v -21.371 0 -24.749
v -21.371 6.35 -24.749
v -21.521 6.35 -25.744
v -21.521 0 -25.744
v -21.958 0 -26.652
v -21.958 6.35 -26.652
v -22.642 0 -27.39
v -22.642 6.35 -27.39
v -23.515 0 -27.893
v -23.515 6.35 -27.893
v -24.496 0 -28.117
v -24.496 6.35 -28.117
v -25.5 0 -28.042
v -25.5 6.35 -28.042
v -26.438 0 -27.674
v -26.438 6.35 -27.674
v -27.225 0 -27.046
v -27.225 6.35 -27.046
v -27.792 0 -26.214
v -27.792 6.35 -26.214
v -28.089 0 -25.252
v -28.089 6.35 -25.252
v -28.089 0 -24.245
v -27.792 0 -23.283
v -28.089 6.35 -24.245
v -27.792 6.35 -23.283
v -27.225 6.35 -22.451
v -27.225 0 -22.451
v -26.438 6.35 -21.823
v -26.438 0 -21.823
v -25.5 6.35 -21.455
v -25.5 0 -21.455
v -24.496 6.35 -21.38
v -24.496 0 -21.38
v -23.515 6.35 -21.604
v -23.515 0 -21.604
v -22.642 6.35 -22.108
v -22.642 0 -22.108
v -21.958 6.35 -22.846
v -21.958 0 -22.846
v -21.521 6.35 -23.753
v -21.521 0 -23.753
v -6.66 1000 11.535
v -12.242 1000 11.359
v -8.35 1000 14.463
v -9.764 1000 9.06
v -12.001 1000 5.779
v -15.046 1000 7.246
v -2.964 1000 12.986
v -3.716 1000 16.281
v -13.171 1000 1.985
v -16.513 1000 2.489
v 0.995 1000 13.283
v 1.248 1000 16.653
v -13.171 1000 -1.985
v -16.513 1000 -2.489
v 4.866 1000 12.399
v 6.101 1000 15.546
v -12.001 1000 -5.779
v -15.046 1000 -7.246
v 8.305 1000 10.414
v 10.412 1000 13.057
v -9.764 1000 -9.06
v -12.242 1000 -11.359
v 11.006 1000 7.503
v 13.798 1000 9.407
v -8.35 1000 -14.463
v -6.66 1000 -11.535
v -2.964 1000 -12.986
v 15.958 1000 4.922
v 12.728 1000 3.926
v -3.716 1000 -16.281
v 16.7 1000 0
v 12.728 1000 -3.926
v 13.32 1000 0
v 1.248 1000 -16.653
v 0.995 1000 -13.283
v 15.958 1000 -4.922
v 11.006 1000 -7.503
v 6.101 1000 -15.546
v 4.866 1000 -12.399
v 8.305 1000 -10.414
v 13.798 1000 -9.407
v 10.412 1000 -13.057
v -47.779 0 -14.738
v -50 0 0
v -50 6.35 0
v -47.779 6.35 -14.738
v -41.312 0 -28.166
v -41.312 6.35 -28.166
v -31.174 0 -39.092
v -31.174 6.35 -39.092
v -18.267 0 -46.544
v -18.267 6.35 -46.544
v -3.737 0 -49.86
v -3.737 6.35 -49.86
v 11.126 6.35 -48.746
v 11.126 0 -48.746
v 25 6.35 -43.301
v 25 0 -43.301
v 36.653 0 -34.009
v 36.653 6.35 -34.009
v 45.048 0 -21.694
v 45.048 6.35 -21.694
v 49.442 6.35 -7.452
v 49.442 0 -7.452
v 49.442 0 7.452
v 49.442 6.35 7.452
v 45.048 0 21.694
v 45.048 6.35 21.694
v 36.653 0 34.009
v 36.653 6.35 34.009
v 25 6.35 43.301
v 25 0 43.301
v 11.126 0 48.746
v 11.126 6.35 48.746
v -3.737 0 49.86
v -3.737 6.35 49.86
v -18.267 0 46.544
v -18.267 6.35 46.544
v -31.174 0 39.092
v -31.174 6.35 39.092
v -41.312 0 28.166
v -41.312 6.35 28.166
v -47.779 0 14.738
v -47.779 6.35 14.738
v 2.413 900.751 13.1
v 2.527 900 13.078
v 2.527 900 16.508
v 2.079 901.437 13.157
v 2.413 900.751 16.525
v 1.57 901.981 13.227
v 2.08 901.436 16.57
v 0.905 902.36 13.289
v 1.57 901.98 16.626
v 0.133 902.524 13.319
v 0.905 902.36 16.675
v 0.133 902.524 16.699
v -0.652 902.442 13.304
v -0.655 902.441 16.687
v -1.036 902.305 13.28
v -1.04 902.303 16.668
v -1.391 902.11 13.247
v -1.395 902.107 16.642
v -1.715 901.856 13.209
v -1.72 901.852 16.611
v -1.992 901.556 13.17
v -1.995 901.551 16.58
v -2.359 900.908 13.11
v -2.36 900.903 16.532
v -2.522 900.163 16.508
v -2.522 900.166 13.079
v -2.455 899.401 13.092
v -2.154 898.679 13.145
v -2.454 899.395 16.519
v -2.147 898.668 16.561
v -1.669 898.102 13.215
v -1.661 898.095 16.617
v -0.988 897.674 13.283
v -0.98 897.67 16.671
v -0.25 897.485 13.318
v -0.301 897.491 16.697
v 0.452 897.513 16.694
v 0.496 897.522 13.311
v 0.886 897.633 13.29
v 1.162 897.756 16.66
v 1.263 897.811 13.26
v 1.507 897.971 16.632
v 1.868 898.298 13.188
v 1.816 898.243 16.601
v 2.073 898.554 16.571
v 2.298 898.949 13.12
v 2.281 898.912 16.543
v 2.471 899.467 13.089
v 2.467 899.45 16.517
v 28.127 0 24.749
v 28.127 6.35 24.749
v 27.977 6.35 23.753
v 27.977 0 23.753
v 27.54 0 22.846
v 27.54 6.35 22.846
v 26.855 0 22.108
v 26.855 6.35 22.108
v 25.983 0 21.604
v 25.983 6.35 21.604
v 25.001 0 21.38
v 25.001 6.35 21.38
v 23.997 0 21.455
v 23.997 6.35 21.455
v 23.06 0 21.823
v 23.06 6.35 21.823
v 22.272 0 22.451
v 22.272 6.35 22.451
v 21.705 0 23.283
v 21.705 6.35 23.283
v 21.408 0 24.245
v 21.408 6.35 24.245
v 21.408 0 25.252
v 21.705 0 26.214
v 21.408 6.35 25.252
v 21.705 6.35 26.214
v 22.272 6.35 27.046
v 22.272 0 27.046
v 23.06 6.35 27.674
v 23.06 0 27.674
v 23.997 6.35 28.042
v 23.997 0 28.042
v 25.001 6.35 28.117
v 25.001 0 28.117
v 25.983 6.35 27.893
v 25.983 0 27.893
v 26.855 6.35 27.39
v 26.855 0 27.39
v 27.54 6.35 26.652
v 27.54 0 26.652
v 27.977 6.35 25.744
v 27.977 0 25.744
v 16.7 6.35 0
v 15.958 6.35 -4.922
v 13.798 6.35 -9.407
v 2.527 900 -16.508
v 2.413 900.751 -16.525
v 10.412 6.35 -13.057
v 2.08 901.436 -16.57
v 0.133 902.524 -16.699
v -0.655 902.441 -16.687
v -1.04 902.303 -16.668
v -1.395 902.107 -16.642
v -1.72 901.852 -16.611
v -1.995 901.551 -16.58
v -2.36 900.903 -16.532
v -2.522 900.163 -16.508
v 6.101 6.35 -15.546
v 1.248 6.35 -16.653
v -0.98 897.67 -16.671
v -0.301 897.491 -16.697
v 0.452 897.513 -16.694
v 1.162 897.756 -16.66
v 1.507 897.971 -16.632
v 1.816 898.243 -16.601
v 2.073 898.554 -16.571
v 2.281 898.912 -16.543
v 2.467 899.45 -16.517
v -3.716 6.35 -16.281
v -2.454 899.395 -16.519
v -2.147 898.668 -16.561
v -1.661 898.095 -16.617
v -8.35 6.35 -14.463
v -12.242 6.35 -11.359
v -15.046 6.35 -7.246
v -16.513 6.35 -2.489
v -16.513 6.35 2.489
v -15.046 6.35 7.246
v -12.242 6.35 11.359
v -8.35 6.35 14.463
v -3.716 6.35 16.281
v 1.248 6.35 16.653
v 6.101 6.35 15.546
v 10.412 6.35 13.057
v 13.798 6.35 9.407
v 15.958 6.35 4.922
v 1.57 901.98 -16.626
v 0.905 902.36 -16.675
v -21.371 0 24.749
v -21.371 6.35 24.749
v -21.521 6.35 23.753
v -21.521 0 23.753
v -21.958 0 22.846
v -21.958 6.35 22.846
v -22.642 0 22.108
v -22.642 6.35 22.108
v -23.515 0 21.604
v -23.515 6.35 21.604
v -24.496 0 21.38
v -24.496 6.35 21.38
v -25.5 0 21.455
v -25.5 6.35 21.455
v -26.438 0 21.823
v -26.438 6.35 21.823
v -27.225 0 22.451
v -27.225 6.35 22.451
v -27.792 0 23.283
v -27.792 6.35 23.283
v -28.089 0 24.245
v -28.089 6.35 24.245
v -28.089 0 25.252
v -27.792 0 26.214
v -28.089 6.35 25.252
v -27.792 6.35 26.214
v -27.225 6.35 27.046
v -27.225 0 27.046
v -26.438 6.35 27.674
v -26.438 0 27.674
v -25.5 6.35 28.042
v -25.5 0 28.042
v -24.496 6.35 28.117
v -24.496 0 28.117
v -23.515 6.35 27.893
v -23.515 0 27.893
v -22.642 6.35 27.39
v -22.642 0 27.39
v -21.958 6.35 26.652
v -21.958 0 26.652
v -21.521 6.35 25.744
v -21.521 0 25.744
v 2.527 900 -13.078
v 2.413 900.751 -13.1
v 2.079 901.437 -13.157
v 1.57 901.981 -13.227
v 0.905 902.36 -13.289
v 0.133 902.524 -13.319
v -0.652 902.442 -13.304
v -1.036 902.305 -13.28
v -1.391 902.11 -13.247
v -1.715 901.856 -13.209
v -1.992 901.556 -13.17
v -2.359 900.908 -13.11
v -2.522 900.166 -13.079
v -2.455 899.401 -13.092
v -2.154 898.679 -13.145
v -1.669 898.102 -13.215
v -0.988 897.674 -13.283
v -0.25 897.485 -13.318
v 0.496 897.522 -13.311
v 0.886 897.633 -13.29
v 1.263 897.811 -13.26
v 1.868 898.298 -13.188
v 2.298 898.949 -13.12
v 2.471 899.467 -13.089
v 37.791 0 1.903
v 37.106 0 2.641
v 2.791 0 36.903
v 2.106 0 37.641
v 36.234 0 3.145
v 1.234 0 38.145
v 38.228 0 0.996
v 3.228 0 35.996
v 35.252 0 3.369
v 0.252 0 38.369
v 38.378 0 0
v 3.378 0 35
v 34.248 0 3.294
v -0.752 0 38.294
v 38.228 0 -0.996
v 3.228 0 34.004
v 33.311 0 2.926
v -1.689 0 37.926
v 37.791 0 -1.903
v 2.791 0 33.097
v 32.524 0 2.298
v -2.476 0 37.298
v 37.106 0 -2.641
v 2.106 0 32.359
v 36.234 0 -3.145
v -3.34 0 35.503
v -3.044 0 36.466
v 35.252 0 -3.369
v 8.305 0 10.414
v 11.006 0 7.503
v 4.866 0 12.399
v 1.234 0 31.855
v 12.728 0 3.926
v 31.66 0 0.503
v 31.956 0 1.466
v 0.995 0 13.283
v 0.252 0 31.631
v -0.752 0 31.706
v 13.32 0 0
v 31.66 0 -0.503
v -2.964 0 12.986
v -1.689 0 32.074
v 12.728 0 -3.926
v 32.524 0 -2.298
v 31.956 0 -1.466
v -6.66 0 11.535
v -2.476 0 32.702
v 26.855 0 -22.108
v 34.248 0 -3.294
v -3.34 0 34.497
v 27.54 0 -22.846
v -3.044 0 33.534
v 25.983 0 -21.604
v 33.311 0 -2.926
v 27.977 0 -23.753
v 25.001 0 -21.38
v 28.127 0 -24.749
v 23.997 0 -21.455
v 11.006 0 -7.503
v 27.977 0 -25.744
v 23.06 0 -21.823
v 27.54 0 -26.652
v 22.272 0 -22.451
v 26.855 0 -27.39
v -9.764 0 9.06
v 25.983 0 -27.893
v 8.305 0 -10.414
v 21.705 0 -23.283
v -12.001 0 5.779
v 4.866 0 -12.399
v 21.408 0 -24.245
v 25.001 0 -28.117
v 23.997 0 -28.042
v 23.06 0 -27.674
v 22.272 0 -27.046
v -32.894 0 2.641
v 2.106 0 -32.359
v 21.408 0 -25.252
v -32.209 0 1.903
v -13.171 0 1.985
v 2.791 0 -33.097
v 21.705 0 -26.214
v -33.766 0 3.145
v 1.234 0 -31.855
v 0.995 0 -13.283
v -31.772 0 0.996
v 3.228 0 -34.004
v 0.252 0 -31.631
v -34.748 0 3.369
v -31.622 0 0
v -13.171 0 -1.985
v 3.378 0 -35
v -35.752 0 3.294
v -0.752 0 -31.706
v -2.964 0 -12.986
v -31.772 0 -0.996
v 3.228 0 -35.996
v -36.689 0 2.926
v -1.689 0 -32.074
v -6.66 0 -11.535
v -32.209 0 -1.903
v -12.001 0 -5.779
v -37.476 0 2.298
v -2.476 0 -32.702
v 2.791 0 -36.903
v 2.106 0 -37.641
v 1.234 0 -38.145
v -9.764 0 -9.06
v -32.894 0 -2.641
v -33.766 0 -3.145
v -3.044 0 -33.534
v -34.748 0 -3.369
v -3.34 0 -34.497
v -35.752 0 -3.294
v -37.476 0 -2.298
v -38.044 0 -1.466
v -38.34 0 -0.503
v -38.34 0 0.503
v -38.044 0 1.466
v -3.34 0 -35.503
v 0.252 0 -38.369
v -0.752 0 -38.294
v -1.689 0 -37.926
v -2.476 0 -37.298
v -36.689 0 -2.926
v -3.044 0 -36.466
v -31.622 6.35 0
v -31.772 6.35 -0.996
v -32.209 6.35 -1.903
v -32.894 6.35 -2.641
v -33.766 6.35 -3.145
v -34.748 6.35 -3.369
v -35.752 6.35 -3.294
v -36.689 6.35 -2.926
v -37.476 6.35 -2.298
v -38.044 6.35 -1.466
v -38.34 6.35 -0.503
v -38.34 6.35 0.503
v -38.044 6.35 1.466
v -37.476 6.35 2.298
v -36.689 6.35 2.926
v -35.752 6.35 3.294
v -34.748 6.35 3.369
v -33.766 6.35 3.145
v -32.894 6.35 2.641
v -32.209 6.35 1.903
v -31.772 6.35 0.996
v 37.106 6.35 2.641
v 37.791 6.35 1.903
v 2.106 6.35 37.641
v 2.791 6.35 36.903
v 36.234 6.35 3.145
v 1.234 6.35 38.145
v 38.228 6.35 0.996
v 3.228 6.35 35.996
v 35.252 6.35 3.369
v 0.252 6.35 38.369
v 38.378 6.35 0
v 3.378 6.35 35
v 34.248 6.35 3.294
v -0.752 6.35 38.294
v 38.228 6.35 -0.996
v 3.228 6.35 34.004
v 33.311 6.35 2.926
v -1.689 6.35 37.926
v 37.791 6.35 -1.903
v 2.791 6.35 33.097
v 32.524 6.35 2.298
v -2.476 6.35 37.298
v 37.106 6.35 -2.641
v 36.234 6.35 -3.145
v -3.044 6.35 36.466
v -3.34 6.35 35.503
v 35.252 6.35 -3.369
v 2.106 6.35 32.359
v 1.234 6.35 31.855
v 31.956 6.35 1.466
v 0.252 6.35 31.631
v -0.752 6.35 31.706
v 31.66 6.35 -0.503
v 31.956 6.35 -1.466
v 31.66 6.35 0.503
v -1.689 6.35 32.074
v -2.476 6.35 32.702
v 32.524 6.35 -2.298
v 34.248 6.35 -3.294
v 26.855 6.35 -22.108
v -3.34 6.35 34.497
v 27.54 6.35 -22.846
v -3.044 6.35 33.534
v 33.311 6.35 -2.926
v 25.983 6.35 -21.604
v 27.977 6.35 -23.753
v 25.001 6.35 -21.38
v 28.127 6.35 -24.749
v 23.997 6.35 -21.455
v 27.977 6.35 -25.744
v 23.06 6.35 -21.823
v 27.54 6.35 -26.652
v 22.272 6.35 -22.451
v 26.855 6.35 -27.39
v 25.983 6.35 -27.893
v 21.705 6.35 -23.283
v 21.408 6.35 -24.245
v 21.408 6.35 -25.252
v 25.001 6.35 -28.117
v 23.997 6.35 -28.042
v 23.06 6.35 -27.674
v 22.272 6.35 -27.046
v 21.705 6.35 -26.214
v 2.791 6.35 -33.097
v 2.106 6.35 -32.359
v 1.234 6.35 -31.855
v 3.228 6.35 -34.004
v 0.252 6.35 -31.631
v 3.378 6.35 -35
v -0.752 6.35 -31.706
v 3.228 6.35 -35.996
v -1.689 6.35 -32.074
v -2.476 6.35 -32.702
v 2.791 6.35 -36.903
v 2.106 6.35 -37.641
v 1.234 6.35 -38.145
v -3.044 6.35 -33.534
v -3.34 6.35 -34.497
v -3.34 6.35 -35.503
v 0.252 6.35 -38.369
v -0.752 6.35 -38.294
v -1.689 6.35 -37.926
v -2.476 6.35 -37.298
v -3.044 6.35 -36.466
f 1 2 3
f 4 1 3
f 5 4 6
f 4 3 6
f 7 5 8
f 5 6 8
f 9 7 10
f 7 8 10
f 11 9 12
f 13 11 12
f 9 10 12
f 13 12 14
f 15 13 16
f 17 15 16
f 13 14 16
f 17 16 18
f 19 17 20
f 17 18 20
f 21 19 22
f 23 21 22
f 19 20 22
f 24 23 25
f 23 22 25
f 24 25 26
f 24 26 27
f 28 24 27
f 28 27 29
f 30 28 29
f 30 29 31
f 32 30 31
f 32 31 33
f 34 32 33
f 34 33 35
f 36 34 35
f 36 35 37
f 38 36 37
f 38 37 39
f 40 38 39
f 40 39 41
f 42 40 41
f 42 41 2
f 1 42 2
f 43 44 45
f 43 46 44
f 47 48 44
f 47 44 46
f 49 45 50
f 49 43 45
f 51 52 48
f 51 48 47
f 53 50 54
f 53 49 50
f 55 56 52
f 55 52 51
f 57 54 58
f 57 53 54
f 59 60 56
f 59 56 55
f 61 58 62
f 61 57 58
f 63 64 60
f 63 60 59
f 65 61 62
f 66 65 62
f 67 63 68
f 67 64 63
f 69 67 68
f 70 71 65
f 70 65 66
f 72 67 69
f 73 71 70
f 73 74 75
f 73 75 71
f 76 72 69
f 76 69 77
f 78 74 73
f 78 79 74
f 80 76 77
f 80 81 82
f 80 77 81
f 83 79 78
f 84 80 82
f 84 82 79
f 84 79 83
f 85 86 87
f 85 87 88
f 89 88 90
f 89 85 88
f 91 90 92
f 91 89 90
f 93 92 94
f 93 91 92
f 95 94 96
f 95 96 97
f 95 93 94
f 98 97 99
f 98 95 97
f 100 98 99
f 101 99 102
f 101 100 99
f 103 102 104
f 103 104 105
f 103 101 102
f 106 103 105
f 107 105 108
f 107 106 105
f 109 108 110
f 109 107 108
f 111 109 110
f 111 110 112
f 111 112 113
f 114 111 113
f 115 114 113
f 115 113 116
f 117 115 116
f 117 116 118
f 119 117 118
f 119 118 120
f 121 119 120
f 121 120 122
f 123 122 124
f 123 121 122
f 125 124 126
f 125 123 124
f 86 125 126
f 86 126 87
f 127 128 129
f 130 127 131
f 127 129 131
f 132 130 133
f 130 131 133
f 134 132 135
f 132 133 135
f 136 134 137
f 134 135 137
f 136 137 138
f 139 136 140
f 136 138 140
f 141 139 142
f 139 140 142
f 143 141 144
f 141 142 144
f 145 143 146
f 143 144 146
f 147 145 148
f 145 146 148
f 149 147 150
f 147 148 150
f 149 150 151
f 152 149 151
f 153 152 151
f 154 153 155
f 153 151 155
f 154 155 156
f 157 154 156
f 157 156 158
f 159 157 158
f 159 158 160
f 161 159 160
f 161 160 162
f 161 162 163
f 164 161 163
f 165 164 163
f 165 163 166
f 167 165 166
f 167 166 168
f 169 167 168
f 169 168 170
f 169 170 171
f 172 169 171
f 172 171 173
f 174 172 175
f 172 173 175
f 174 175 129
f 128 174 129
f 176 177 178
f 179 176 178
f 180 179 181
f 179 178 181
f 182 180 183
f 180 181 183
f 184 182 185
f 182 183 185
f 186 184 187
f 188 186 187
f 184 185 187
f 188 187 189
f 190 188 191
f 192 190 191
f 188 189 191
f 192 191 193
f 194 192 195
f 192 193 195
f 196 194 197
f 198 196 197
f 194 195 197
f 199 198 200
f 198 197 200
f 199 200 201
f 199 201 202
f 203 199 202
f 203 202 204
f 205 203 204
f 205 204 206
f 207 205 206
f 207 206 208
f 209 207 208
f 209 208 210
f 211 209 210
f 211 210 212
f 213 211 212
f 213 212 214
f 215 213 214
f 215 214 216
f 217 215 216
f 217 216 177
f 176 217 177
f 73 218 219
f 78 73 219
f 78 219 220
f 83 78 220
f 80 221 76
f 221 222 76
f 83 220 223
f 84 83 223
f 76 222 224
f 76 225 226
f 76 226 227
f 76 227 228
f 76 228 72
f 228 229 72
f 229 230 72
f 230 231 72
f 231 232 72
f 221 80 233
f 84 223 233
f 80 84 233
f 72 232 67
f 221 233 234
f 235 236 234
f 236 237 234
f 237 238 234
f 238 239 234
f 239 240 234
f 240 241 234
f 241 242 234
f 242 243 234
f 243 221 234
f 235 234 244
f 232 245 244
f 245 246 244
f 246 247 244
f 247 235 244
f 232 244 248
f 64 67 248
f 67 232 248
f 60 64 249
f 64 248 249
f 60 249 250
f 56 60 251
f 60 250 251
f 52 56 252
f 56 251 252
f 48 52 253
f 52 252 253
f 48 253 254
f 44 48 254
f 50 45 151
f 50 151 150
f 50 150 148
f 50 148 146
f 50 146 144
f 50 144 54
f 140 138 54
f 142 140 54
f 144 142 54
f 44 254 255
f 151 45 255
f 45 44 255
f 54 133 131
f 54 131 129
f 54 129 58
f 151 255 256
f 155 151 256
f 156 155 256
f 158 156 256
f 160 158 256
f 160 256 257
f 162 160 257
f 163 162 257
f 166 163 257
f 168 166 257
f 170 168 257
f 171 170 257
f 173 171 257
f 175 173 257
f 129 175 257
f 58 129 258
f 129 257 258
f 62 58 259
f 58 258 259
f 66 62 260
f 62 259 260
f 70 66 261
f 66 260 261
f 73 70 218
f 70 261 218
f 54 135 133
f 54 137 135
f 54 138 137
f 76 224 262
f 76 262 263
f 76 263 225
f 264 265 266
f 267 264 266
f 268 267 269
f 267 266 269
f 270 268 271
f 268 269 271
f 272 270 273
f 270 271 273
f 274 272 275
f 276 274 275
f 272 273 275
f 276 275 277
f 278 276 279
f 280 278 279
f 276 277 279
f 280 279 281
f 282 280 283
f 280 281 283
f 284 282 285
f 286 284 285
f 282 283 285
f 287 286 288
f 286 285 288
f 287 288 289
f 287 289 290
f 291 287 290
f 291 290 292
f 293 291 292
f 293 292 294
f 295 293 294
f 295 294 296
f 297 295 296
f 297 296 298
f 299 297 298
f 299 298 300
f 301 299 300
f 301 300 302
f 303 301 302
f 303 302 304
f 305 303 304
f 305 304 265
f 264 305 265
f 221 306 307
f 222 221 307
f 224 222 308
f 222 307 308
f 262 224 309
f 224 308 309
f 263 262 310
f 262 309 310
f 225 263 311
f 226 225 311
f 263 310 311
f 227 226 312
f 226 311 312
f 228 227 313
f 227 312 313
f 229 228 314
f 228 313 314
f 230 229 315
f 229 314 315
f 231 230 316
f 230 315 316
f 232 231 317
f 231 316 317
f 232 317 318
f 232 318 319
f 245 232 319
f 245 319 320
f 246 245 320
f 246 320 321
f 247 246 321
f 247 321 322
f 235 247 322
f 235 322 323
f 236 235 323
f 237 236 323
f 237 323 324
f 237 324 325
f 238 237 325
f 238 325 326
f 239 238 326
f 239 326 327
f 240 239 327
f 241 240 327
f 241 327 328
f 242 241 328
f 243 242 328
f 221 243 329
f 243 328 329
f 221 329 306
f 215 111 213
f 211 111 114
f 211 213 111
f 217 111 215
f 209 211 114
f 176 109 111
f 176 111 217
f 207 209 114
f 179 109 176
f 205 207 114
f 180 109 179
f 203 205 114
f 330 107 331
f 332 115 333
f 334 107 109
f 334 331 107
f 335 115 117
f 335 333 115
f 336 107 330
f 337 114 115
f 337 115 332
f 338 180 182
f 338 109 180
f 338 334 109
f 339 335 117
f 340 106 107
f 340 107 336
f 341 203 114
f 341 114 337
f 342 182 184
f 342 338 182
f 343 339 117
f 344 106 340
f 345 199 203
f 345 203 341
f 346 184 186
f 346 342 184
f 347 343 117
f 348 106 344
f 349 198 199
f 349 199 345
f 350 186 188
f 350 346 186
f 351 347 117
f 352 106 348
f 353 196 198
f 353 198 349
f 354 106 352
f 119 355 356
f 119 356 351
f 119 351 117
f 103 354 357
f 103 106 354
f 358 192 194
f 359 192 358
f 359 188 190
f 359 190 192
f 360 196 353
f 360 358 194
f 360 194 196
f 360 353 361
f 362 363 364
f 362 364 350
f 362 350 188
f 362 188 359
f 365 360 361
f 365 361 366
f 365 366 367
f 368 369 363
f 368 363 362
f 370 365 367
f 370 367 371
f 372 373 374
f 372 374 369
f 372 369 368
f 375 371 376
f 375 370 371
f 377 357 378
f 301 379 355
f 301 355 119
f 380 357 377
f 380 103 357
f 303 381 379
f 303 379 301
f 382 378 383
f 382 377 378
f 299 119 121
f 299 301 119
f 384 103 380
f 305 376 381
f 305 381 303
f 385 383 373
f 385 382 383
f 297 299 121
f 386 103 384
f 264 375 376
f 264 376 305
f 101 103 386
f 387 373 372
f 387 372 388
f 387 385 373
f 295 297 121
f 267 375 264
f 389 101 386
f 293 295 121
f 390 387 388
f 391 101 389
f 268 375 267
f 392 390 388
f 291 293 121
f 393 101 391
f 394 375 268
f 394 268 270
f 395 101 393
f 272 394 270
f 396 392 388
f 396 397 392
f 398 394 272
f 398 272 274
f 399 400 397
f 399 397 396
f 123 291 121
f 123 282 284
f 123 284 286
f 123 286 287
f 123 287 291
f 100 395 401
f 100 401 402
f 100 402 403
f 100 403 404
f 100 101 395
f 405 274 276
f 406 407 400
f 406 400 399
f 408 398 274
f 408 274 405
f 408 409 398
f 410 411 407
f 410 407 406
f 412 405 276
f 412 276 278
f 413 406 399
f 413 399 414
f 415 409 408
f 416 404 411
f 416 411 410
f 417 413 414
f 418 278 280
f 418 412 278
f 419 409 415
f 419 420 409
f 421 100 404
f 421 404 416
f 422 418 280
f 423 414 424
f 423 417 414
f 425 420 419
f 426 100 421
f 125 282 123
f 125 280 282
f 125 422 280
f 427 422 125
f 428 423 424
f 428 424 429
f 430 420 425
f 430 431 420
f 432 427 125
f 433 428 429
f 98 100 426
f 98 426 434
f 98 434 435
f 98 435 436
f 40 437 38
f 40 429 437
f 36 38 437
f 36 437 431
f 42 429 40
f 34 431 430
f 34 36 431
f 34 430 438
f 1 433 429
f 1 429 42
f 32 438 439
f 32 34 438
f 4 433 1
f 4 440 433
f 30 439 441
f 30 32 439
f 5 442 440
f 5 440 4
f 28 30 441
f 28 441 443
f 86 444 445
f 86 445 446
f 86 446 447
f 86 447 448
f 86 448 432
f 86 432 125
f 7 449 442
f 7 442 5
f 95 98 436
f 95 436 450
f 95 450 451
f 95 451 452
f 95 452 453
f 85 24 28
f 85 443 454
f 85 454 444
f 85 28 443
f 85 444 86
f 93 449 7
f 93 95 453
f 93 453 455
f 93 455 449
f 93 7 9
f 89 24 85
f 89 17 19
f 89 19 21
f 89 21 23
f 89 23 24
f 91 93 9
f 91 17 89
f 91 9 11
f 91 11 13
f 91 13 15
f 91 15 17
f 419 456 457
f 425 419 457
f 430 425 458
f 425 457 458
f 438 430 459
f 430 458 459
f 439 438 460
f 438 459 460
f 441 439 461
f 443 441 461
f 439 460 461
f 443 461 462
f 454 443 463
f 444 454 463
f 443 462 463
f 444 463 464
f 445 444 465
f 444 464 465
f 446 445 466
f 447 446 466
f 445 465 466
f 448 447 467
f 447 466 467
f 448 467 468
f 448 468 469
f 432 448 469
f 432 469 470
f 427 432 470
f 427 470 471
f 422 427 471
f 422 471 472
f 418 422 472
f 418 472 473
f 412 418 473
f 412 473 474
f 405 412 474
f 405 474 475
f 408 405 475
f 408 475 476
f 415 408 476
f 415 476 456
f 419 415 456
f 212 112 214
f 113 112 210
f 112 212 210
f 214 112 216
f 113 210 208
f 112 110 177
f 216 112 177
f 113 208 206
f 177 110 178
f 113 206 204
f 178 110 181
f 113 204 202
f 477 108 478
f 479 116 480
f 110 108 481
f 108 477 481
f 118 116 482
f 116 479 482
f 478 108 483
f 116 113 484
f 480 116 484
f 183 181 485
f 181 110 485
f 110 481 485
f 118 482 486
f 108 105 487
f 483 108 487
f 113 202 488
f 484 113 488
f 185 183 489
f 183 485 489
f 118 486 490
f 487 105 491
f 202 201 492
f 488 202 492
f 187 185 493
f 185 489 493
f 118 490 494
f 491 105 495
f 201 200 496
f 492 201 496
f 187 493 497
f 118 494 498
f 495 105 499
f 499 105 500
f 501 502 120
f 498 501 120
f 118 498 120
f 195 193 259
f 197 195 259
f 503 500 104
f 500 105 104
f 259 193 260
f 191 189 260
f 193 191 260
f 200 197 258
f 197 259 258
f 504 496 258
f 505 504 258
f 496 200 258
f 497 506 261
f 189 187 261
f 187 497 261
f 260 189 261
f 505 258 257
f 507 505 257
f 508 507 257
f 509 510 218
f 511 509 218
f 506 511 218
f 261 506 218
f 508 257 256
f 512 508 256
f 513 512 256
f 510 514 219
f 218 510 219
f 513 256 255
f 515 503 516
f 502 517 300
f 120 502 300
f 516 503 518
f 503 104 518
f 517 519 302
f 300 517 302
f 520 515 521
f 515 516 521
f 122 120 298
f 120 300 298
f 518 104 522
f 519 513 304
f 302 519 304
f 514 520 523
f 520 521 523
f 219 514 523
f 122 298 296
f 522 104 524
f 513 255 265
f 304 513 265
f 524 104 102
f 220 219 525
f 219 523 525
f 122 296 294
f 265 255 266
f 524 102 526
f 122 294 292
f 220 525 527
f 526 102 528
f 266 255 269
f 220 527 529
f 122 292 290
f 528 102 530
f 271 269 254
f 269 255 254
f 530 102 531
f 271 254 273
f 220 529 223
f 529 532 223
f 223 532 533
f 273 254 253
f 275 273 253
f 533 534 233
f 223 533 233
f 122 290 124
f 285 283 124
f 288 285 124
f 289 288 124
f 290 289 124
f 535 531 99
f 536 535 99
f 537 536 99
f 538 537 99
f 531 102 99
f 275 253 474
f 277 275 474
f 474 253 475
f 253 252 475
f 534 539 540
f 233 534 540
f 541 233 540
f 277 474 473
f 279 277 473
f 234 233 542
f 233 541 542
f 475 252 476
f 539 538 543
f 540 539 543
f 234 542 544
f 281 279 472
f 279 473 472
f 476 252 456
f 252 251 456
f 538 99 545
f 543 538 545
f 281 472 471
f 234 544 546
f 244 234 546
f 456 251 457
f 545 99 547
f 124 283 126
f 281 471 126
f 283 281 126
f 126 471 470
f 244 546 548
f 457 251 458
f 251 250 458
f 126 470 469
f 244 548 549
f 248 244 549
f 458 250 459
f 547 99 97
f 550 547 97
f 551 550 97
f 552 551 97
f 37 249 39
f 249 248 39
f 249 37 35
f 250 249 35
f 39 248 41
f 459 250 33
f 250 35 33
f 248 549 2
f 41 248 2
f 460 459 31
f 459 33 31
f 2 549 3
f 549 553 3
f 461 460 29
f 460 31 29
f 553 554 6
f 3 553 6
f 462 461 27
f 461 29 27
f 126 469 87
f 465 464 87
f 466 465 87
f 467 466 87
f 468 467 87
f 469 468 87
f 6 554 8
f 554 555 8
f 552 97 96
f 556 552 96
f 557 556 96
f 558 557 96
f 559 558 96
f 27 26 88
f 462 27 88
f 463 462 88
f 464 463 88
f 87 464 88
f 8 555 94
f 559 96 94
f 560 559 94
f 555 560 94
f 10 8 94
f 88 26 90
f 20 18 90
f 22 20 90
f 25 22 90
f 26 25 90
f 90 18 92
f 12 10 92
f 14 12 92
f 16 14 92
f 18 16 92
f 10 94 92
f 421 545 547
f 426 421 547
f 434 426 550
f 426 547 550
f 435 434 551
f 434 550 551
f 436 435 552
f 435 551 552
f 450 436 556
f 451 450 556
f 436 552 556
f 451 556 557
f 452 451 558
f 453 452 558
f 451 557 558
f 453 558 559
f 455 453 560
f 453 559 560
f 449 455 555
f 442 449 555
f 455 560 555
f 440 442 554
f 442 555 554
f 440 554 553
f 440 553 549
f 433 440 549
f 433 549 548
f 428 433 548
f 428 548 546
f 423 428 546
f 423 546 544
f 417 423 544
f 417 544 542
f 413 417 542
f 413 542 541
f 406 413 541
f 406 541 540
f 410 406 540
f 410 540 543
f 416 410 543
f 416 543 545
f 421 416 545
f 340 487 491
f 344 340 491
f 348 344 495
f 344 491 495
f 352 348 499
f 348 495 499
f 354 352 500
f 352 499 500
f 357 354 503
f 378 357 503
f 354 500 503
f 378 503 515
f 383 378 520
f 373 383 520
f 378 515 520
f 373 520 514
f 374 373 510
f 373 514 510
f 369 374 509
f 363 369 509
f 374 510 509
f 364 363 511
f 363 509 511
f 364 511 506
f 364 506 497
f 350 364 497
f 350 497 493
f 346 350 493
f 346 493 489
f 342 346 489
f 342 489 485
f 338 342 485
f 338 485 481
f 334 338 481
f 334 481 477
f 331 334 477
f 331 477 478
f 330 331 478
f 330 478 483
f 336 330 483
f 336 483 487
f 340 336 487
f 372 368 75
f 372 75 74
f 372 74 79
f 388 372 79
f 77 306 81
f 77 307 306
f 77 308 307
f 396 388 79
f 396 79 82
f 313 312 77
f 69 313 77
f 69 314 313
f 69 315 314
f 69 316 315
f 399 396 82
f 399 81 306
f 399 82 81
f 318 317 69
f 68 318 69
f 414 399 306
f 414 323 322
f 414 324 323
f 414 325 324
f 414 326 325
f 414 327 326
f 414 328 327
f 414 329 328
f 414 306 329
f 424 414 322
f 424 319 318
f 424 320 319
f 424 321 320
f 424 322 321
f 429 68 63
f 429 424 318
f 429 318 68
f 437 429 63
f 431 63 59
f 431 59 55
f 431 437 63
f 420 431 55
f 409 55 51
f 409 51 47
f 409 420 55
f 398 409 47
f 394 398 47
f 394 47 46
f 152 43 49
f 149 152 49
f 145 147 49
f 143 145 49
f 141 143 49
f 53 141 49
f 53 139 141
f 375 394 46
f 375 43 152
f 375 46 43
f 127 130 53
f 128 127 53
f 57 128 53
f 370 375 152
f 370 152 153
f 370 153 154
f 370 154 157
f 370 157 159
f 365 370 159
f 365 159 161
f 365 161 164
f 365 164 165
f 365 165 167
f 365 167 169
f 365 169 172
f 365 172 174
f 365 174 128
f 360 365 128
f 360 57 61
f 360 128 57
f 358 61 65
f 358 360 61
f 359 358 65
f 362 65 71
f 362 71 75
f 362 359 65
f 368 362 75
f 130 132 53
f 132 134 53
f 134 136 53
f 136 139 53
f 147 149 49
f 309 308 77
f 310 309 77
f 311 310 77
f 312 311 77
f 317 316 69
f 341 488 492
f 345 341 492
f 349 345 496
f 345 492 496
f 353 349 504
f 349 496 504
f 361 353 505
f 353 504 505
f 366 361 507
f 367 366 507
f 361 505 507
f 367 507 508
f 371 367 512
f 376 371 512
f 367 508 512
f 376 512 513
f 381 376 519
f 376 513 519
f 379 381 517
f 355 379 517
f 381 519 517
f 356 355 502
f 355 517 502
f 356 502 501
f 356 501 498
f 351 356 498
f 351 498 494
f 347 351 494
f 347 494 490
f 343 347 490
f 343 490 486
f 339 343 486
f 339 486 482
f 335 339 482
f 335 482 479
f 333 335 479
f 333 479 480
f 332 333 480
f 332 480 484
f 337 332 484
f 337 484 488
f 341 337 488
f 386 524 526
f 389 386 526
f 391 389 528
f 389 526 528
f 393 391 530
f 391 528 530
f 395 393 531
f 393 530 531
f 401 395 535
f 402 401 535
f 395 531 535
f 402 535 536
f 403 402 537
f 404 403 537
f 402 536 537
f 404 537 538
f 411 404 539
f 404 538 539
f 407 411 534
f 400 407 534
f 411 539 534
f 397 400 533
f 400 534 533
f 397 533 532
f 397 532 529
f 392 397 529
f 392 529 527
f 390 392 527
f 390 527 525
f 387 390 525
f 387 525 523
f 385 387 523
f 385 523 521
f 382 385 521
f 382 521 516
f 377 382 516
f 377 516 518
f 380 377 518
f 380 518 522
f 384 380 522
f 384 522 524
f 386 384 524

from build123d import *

# Parameters (mm, degrees)
SKETCH1_R                      = 16.7
SKETCH1_R_2                    = 13.32
BOSS_EXTRUDE1_DEPTH            = 1000
SKETCH13_R                     = 50
SKETCH13_R_2                   = 16.7
BOSS_EXTRUDE2_DEPTH            = 6.35
F_1_4_CLEARANCE_HOLE1_D        = 6.7564
F_1_4_CLEARANCE_HOLE1_DEPTH    = 50
F_8_0_199_DIAMETER_HOLE6_D     = 5.0546
F_8_0_199_DIAMETER_HOLE6_DEPTH = 50


with BuildPart() as part:
    # Sketch1 → Boss-Extrude1 (new body)
    with BuildSketch(Plane(origin=(0, 0, 0), x_dir=(1, 0, 0), z_dir=(0, 1, 0))):
        Circle(SKETCH1_R)
        Circle(SKETCH1_R_2, mode=Mode.SUBTRACT)
    extrude(amount=BOSS_EXTRUDE1_DEPTH)

    # Sketch13 → Boss-Extrude2 (add)
    with BuildSketch(Plane(origin=(0, 0, 0), x_dir=(-1, 0, 0), z_dir=(0, -1, 0))):
        Circle(SKETCH13_R)
        Circle(SKETCH13_R_2, mode=Mode.SUBTRACT)
    extrude(amount=-BOSS_EXTRUDE2_DEPTH)

    # 1/4 Clearance Hole1
    with Locations(Plane(origin=(0, 0, 0), x_dir=(-1, 0, 0), z_dir=(0, -1, 0))):
        with Locations((-35, 0), (0, 35), (35, 0), (0, -35), (24.748737342, 24.748737342), (24.748737342, -24.748737342), (-24.748737342, -24.748737342), (-24.748737342, 24.748737342)):
            Hole(F_1_4_CLEARANCE_HOLE1_D / 2, depth=F_1_4_CLEARANCE_HOLE1_DEPTH)

    # #8 (0.199) Diameter Hole6
    with Locations(Plane(origin=(0, 900, -16.7), x_dir=(-1, 0, 0), z_dir=(0, 0, -1))):
        with Locations((0, 0)):
            Hole(F_8_0_199_DIAMETER_HOLE6_D / 2, depth=F_8_0_199_DIAMETER_HOLE6_DEPTH)


solid = part.part
